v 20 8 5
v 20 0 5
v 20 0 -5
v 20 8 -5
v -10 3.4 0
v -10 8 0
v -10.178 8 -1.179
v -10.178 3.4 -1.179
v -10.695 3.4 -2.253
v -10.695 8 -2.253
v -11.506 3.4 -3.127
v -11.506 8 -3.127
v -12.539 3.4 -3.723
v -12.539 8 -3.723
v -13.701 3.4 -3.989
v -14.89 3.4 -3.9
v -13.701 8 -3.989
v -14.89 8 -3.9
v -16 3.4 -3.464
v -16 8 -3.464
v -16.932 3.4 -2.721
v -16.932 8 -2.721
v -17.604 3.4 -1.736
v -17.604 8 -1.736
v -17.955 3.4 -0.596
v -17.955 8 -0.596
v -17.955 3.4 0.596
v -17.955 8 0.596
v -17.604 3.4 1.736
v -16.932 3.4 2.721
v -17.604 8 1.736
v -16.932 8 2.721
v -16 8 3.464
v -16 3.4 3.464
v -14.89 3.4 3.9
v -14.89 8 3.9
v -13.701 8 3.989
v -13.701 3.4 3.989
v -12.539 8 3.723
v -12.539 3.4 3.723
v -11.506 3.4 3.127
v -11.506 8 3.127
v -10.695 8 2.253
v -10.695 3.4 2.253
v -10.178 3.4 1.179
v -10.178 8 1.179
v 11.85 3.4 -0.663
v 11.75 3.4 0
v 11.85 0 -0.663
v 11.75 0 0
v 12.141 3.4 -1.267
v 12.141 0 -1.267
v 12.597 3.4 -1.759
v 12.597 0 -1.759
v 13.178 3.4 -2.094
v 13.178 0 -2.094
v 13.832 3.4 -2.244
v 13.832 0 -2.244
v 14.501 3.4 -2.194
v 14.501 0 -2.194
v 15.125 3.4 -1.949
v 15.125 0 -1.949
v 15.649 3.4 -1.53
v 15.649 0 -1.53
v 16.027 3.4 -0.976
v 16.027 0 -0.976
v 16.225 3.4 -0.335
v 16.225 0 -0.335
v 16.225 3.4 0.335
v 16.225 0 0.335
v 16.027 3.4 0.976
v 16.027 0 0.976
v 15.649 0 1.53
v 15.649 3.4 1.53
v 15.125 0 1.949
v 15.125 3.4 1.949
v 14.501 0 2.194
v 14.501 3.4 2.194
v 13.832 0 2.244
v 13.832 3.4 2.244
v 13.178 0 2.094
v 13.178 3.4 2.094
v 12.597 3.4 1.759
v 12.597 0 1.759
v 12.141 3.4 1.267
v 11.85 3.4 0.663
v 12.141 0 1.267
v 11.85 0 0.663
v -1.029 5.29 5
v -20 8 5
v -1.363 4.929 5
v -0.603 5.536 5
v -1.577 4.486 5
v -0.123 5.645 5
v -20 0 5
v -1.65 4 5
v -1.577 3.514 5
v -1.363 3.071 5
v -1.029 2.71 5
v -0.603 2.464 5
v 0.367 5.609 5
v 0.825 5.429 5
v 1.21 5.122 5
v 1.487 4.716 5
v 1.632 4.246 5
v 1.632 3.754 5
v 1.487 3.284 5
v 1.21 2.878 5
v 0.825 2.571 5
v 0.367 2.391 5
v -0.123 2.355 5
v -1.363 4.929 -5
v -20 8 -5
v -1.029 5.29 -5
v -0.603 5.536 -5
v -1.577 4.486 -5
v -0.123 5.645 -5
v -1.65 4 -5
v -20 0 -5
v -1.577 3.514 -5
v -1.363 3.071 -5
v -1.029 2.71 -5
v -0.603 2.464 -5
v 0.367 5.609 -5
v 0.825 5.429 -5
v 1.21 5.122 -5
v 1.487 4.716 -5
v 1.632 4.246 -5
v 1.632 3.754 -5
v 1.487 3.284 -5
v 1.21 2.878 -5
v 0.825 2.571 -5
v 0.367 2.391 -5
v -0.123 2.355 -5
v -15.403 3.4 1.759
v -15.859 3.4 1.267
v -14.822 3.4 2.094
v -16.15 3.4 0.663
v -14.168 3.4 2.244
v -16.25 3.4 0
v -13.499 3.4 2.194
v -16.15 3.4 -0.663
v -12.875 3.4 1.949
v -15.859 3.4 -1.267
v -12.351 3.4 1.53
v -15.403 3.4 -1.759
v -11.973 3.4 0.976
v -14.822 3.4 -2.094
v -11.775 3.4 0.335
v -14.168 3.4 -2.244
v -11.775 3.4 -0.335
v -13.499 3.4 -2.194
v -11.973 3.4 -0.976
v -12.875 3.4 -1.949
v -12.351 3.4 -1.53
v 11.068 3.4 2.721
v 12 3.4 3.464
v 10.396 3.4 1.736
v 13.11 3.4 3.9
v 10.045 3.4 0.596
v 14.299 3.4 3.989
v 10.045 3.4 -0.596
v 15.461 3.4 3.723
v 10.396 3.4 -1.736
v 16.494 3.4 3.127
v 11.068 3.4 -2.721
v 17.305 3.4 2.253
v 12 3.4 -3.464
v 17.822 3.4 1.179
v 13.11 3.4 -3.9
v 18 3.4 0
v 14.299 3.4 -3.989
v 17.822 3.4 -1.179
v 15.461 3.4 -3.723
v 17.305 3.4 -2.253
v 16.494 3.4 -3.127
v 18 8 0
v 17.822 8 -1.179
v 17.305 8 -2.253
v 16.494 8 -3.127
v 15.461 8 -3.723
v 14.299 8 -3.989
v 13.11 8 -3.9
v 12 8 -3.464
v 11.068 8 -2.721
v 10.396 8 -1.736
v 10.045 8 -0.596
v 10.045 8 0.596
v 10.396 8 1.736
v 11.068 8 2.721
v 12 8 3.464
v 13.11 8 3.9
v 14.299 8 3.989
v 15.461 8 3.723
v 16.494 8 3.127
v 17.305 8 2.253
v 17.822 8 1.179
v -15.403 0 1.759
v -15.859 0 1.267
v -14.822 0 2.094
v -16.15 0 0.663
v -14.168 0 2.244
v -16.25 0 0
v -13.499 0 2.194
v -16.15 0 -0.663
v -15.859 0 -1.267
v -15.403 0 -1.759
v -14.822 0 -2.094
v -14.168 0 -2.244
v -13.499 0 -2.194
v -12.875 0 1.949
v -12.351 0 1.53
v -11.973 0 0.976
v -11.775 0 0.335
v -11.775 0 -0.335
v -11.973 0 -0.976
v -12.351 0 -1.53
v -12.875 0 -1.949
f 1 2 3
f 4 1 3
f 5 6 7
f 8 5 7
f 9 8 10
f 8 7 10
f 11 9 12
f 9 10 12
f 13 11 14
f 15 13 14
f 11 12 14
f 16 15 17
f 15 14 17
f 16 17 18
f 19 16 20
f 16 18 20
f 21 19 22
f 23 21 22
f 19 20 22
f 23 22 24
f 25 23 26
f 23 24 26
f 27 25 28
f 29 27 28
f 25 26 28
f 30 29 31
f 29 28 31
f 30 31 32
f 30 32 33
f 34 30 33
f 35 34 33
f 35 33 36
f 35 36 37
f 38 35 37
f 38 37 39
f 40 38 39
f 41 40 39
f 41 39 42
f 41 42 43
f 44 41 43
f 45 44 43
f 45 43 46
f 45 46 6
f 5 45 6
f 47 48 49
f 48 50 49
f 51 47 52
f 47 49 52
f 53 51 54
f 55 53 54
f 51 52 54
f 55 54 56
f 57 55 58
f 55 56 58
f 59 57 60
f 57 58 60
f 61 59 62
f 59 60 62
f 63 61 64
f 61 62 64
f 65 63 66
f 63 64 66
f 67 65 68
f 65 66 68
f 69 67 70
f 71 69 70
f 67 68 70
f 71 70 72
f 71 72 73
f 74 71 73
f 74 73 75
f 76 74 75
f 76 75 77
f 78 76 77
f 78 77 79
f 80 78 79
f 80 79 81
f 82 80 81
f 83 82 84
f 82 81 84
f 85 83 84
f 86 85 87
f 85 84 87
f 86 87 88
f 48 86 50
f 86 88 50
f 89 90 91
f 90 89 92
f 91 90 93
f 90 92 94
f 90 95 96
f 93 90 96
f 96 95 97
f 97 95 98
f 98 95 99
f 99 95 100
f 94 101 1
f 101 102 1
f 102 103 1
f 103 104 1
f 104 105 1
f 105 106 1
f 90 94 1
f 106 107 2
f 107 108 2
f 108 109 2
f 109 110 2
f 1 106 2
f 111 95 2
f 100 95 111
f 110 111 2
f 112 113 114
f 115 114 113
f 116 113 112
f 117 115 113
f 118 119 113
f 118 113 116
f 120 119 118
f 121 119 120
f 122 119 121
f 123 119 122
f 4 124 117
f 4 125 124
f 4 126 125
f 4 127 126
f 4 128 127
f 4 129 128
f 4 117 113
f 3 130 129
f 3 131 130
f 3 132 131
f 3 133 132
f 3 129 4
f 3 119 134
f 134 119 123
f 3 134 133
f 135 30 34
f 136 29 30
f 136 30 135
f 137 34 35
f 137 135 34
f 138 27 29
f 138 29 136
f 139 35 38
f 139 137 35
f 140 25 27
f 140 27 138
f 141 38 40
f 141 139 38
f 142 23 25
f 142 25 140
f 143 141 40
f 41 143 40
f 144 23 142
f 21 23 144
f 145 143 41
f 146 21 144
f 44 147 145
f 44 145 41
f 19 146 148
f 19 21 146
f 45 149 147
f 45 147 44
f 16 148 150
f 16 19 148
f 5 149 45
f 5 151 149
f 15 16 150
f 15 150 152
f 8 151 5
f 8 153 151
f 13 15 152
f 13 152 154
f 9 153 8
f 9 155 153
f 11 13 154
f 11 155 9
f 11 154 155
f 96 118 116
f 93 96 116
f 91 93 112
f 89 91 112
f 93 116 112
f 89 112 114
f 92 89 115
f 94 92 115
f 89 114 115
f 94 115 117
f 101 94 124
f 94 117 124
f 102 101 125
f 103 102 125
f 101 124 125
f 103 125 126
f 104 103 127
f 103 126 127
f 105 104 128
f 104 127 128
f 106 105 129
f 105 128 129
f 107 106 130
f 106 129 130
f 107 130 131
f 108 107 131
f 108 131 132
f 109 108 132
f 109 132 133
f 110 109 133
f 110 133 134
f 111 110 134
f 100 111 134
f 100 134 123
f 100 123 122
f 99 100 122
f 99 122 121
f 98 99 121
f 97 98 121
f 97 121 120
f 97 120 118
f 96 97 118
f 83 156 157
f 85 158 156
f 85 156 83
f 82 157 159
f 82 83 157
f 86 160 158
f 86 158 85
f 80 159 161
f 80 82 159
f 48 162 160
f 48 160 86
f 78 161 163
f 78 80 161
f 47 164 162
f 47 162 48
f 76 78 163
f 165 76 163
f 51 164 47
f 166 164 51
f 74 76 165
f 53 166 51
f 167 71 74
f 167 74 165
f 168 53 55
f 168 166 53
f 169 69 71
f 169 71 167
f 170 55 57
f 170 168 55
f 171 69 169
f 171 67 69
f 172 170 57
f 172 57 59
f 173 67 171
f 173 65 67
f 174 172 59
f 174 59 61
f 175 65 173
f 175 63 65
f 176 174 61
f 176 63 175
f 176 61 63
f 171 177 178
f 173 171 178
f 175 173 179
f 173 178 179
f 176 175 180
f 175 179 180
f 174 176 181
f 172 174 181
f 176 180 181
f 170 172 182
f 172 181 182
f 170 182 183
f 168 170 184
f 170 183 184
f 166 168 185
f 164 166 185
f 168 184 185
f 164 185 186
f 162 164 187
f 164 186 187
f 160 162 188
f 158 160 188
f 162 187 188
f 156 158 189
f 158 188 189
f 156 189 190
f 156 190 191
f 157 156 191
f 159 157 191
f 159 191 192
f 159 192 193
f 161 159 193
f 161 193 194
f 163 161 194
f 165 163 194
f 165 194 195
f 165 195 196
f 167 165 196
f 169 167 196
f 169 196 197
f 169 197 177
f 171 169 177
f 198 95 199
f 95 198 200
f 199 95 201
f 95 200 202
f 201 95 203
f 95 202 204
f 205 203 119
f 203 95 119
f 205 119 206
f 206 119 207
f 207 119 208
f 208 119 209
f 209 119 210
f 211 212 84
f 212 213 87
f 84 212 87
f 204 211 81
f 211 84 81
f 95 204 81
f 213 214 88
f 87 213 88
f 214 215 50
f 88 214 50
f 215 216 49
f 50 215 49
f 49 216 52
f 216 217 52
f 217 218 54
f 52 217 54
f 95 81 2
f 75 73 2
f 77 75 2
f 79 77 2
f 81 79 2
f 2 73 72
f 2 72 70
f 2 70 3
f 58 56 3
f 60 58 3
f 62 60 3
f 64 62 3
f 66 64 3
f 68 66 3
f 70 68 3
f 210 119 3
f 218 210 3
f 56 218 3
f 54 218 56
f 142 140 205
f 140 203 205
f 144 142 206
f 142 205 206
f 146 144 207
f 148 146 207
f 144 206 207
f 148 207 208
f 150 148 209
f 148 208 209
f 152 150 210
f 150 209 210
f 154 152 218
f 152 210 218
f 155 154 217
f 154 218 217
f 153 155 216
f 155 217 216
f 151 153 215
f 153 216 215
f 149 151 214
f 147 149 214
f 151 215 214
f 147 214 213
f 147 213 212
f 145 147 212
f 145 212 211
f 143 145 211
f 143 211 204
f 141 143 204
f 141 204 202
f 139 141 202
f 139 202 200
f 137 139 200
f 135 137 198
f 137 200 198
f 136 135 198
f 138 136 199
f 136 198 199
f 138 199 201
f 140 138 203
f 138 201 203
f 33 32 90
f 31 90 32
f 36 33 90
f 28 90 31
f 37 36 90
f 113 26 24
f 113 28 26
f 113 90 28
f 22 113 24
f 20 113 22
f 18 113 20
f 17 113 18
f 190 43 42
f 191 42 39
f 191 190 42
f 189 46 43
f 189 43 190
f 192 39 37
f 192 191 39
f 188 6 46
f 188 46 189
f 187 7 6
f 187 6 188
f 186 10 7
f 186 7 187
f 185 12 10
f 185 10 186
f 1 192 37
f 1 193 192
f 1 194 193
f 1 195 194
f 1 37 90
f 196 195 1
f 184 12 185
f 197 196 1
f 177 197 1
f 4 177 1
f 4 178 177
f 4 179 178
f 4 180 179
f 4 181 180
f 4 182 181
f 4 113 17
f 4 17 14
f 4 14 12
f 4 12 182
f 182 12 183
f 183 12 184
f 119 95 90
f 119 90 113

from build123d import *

# Parameters (mm, degrees)
SKETCH_1_W                = 40
SKETCH_1_H                = 10
EXTRUDE_1_DEPTH           = 8
HOLE_WIZARD_1_D           = 4.5
HOLE_WIZARD_1_CBORE_D     = 8
HOLE_WIZARD_1_CBORE_DEPTH = 4.6
HOLE_WIZARD_M4_1_D        = 3.3


with BuildPart() as part:
    # 草图1 → 凸台-拉伸1 (new body)
    with BuildSketch(Plane(origin=(0, 0, 0), x_dir=(1, 0, 0), z_dir=(0, 1, 0))):
        Rectangle(SKETCH_1_W, SKETCH_1_H)
    extrude(amount=EXTRUDE_1_DEPTH)

    # 打孔尺寸(%根据)内六角圆柱头螺钉的类型1 (through all)
    with Locations(Plane(origin=(0, 8, 0), x_dir=(1, 0, 0), z_dir=(0, 1, 0))):
        with Locations((14, 0), (-14, 0)):
            CounterBoreHole(HOLE_WIZARD_1_D / 2, HOLE_WIZARD_1_CBORE_D / 2, HOLE_WIZARD_1_CBORE_DEPTH)

    # M4 螺纹孔1 (through all)
    with Locations(Plane.XY.offset(5)):
        with Locations((0, 4)):
            Hole(HOLE_WIZARD_M4_1_D / 2)


solid = part.part
